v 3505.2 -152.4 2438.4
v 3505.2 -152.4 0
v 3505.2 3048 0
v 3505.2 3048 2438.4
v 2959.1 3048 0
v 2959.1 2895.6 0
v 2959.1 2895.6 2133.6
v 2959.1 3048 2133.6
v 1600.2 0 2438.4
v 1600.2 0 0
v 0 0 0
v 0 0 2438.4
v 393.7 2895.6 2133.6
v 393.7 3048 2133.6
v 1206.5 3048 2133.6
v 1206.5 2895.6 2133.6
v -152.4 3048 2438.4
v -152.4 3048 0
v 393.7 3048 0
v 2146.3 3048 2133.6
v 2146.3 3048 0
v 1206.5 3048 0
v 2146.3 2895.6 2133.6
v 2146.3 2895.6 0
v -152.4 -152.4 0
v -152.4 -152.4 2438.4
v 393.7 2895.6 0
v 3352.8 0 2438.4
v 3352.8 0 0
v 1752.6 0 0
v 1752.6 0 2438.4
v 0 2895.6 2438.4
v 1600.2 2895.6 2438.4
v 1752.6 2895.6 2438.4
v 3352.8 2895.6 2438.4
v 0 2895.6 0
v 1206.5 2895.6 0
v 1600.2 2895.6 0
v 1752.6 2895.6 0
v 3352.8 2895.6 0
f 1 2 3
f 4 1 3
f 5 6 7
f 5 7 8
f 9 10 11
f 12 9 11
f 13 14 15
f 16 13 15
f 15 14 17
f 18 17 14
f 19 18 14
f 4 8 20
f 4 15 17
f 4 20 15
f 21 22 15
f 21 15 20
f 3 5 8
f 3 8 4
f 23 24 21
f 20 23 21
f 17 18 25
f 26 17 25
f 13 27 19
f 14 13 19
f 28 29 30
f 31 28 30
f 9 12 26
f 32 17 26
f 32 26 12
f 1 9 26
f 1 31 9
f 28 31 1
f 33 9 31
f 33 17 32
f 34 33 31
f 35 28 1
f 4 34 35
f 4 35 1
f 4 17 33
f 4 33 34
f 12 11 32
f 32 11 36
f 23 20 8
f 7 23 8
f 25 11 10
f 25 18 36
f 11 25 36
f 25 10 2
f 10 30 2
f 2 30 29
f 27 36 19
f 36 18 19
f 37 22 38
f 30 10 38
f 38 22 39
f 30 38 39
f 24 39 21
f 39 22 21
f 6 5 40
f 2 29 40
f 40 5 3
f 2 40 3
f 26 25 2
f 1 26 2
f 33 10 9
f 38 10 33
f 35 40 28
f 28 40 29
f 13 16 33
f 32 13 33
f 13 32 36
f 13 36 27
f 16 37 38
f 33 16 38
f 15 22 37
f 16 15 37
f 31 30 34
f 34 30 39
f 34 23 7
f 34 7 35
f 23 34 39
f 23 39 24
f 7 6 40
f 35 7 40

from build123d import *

# Parameters (mm, degrees)
F0_W     = 152.4
F0_H     = 2895.6
F0_W_2   = 812.8
F0_H_2   = 152.4
F1_DEPTH = 2438.4
F2_DEPTH = 2133.6
F3_DEPTH = 2438.4
F4_DEPTH = 2438.4
F5_DEPTH = 2133.6


with BuildPart() as f1:
    # F0 (on Top) → F1 (new body)
    with BuildSketch(Plane.XY):
        Polygon((3352.8, 2895.6), (3352.8, 0), (1752.6, 0), (1600.2, 0), (0, 0), (0, 2895.6), (393.7, 2895.6), (393.7, 3048), (0, 3048), (-152.4, 3048), (-152.4, 2895.6), (-152.4, 0), (-152.4, -152.4), (0, -152.4), (3352.8, -152.4), (3505.2, -152.4), (3505.2, 0), (3505.2, 2895.6), (3505.2, 3048), (3352.8, 3048), (2959.1, 3048), (2959.1, 2895.6), align=None)
        with Locations((1676.4, 1447.8)):
            Rectangle(F0_W, F0_H)
        with Locations((800.1, 2971.8)):
            Rectangle(F0_W_2, F0_H_2)
    extrude(amount=F1_DEPTH)

    # F0 (on Top) → F2 (cut)
    with BuildSketch(Plane.XY):
        with Locations((800.1, 2971.8)):
            Rectangle(F0_W_2, F0_H_2)
    extrude(amount=F2_DEPTH, mode=Mode.SUBTRACT)

    # F0 (on Top) → F3 (join)
    with BuildSketch(Plane.XY):
        Polygon((1600.2, 2895.6), (1752.6, 2895.6), (2146.3, 2895.6), (2146.3, 3048), (1206.5, 3048), (1206.5, 2895.6), align=None)
    extrude(amount=F3_DEPTH)

    # F0 (on Top) → F4 (join)
    with BuildSketch(Plane.XY):
        with Locations((2552.7, 2971.8)):
            Rectangle(F0_W_2, F0_H_2)
    extrude(amount=F4_DEPTH)

    # F0 (on Top) → F5 (cut)
    with BuildSketch(Plane.XY):
        with Locations((2552.7, 2971.8)):
            Rectangle(F0_W_2, F0_H_2)
    extrude(amount=F5_DEPTH, mode=Mode.SUBTRACT)


solid = f1.part
